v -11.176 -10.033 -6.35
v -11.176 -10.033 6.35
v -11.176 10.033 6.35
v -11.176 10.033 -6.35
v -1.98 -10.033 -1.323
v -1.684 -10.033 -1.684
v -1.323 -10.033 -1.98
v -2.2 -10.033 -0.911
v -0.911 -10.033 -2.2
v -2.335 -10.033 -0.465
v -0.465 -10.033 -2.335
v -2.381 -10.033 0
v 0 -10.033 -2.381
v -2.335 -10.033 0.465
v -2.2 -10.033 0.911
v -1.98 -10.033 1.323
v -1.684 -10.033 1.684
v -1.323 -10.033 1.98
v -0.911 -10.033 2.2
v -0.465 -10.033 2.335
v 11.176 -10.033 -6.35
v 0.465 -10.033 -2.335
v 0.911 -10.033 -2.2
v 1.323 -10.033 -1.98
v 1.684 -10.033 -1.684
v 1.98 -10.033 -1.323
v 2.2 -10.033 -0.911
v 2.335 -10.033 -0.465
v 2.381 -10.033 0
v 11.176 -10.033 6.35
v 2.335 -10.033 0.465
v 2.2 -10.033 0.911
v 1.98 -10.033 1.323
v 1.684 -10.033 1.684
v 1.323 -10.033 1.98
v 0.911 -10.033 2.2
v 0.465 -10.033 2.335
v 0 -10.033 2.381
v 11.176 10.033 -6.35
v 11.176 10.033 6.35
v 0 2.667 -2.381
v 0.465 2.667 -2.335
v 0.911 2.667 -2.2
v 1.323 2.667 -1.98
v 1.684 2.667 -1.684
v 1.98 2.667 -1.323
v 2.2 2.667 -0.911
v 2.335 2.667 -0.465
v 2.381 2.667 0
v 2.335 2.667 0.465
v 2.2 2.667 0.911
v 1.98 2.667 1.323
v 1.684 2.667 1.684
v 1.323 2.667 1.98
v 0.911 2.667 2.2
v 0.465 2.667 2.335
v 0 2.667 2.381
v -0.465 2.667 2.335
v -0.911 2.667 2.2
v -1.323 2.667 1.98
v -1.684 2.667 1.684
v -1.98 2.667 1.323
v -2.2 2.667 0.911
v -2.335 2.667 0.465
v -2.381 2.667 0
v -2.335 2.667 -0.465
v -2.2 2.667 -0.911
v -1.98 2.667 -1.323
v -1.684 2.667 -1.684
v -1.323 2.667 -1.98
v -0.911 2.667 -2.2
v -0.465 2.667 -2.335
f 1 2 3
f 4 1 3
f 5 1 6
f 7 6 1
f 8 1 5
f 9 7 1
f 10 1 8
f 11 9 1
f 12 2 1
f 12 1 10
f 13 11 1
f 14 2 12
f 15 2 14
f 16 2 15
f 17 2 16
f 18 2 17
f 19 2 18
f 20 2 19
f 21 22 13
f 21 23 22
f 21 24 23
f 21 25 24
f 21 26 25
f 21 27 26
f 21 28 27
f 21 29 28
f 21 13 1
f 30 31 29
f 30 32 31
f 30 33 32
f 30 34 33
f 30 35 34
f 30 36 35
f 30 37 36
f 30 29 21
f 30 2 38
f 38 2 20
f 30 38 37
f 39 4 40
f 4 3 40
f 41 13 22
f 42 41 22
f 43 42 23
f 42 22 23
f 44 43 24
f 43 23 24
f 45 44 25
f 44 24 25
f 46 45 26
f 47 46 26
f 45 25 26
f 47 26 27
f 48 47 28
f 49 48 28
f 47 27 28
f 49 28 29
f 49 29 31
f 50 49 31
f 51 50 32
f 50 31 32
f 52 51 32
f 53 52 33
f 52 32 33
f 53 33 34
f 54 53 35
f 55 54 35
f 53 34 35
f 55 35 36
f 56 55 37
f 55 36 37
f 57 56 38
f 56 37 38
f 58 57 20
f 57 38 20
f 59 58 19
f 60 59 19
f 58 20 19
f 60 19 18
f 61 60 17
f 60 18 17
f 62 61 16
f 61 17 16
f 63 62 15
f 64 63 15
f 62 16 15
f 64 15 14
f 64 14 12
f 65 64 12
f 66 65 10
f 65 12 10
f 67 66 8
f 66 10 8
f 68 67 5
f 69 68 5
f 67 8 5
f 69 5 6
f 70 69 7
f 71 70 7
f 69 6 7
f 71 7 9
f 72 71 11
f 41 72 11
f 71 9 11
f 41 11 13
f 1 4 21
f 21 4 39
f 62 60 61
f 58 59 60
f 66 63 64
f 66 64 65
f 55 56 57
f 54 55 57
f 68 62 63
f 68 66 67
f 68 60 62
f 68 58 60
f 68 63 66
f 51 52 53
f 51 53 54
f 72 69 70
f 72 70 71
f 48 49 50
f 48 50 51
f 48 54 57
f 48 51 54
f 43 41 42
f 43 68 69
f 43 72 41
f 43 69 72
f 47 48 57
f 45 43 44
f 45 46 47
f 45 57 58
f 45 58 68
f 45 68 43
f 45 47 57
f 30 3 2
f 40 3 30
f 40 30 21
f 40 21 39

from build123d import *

# Parameters (mm, degrees)
SKETCH1_W      = 22.352
SKETCH1_H      = 20.066
EXTRUDE1_DEPTH = 6.35
SKETCH2_R      = 2.38125
EXTRUDE2_DEPTH = 12.7


with BuildPart() as part:
    # Sketch1 → Extrude1 (new body, symmetric)
    with BuildSketch(Plane.XY):
        Rectangle(SKETCH1_W, SKETCH1_H)
    extrude(amount=EXTRUDE1_DEPTH, both=True)

    # Sketch2 → Extrude2 (cut)
    with BuildSketch(Plane.XZ.offset(10.033)):
        with Locations(Location((0, 0, 0), (0, 0, 270))):  # turned: the seam where the file's is
            Circle(SKETCH2_R)
    extrude(amount=-EXTRUDE2_DEPTH, mode=Mode.SUBTRACT)


solid = part.part
